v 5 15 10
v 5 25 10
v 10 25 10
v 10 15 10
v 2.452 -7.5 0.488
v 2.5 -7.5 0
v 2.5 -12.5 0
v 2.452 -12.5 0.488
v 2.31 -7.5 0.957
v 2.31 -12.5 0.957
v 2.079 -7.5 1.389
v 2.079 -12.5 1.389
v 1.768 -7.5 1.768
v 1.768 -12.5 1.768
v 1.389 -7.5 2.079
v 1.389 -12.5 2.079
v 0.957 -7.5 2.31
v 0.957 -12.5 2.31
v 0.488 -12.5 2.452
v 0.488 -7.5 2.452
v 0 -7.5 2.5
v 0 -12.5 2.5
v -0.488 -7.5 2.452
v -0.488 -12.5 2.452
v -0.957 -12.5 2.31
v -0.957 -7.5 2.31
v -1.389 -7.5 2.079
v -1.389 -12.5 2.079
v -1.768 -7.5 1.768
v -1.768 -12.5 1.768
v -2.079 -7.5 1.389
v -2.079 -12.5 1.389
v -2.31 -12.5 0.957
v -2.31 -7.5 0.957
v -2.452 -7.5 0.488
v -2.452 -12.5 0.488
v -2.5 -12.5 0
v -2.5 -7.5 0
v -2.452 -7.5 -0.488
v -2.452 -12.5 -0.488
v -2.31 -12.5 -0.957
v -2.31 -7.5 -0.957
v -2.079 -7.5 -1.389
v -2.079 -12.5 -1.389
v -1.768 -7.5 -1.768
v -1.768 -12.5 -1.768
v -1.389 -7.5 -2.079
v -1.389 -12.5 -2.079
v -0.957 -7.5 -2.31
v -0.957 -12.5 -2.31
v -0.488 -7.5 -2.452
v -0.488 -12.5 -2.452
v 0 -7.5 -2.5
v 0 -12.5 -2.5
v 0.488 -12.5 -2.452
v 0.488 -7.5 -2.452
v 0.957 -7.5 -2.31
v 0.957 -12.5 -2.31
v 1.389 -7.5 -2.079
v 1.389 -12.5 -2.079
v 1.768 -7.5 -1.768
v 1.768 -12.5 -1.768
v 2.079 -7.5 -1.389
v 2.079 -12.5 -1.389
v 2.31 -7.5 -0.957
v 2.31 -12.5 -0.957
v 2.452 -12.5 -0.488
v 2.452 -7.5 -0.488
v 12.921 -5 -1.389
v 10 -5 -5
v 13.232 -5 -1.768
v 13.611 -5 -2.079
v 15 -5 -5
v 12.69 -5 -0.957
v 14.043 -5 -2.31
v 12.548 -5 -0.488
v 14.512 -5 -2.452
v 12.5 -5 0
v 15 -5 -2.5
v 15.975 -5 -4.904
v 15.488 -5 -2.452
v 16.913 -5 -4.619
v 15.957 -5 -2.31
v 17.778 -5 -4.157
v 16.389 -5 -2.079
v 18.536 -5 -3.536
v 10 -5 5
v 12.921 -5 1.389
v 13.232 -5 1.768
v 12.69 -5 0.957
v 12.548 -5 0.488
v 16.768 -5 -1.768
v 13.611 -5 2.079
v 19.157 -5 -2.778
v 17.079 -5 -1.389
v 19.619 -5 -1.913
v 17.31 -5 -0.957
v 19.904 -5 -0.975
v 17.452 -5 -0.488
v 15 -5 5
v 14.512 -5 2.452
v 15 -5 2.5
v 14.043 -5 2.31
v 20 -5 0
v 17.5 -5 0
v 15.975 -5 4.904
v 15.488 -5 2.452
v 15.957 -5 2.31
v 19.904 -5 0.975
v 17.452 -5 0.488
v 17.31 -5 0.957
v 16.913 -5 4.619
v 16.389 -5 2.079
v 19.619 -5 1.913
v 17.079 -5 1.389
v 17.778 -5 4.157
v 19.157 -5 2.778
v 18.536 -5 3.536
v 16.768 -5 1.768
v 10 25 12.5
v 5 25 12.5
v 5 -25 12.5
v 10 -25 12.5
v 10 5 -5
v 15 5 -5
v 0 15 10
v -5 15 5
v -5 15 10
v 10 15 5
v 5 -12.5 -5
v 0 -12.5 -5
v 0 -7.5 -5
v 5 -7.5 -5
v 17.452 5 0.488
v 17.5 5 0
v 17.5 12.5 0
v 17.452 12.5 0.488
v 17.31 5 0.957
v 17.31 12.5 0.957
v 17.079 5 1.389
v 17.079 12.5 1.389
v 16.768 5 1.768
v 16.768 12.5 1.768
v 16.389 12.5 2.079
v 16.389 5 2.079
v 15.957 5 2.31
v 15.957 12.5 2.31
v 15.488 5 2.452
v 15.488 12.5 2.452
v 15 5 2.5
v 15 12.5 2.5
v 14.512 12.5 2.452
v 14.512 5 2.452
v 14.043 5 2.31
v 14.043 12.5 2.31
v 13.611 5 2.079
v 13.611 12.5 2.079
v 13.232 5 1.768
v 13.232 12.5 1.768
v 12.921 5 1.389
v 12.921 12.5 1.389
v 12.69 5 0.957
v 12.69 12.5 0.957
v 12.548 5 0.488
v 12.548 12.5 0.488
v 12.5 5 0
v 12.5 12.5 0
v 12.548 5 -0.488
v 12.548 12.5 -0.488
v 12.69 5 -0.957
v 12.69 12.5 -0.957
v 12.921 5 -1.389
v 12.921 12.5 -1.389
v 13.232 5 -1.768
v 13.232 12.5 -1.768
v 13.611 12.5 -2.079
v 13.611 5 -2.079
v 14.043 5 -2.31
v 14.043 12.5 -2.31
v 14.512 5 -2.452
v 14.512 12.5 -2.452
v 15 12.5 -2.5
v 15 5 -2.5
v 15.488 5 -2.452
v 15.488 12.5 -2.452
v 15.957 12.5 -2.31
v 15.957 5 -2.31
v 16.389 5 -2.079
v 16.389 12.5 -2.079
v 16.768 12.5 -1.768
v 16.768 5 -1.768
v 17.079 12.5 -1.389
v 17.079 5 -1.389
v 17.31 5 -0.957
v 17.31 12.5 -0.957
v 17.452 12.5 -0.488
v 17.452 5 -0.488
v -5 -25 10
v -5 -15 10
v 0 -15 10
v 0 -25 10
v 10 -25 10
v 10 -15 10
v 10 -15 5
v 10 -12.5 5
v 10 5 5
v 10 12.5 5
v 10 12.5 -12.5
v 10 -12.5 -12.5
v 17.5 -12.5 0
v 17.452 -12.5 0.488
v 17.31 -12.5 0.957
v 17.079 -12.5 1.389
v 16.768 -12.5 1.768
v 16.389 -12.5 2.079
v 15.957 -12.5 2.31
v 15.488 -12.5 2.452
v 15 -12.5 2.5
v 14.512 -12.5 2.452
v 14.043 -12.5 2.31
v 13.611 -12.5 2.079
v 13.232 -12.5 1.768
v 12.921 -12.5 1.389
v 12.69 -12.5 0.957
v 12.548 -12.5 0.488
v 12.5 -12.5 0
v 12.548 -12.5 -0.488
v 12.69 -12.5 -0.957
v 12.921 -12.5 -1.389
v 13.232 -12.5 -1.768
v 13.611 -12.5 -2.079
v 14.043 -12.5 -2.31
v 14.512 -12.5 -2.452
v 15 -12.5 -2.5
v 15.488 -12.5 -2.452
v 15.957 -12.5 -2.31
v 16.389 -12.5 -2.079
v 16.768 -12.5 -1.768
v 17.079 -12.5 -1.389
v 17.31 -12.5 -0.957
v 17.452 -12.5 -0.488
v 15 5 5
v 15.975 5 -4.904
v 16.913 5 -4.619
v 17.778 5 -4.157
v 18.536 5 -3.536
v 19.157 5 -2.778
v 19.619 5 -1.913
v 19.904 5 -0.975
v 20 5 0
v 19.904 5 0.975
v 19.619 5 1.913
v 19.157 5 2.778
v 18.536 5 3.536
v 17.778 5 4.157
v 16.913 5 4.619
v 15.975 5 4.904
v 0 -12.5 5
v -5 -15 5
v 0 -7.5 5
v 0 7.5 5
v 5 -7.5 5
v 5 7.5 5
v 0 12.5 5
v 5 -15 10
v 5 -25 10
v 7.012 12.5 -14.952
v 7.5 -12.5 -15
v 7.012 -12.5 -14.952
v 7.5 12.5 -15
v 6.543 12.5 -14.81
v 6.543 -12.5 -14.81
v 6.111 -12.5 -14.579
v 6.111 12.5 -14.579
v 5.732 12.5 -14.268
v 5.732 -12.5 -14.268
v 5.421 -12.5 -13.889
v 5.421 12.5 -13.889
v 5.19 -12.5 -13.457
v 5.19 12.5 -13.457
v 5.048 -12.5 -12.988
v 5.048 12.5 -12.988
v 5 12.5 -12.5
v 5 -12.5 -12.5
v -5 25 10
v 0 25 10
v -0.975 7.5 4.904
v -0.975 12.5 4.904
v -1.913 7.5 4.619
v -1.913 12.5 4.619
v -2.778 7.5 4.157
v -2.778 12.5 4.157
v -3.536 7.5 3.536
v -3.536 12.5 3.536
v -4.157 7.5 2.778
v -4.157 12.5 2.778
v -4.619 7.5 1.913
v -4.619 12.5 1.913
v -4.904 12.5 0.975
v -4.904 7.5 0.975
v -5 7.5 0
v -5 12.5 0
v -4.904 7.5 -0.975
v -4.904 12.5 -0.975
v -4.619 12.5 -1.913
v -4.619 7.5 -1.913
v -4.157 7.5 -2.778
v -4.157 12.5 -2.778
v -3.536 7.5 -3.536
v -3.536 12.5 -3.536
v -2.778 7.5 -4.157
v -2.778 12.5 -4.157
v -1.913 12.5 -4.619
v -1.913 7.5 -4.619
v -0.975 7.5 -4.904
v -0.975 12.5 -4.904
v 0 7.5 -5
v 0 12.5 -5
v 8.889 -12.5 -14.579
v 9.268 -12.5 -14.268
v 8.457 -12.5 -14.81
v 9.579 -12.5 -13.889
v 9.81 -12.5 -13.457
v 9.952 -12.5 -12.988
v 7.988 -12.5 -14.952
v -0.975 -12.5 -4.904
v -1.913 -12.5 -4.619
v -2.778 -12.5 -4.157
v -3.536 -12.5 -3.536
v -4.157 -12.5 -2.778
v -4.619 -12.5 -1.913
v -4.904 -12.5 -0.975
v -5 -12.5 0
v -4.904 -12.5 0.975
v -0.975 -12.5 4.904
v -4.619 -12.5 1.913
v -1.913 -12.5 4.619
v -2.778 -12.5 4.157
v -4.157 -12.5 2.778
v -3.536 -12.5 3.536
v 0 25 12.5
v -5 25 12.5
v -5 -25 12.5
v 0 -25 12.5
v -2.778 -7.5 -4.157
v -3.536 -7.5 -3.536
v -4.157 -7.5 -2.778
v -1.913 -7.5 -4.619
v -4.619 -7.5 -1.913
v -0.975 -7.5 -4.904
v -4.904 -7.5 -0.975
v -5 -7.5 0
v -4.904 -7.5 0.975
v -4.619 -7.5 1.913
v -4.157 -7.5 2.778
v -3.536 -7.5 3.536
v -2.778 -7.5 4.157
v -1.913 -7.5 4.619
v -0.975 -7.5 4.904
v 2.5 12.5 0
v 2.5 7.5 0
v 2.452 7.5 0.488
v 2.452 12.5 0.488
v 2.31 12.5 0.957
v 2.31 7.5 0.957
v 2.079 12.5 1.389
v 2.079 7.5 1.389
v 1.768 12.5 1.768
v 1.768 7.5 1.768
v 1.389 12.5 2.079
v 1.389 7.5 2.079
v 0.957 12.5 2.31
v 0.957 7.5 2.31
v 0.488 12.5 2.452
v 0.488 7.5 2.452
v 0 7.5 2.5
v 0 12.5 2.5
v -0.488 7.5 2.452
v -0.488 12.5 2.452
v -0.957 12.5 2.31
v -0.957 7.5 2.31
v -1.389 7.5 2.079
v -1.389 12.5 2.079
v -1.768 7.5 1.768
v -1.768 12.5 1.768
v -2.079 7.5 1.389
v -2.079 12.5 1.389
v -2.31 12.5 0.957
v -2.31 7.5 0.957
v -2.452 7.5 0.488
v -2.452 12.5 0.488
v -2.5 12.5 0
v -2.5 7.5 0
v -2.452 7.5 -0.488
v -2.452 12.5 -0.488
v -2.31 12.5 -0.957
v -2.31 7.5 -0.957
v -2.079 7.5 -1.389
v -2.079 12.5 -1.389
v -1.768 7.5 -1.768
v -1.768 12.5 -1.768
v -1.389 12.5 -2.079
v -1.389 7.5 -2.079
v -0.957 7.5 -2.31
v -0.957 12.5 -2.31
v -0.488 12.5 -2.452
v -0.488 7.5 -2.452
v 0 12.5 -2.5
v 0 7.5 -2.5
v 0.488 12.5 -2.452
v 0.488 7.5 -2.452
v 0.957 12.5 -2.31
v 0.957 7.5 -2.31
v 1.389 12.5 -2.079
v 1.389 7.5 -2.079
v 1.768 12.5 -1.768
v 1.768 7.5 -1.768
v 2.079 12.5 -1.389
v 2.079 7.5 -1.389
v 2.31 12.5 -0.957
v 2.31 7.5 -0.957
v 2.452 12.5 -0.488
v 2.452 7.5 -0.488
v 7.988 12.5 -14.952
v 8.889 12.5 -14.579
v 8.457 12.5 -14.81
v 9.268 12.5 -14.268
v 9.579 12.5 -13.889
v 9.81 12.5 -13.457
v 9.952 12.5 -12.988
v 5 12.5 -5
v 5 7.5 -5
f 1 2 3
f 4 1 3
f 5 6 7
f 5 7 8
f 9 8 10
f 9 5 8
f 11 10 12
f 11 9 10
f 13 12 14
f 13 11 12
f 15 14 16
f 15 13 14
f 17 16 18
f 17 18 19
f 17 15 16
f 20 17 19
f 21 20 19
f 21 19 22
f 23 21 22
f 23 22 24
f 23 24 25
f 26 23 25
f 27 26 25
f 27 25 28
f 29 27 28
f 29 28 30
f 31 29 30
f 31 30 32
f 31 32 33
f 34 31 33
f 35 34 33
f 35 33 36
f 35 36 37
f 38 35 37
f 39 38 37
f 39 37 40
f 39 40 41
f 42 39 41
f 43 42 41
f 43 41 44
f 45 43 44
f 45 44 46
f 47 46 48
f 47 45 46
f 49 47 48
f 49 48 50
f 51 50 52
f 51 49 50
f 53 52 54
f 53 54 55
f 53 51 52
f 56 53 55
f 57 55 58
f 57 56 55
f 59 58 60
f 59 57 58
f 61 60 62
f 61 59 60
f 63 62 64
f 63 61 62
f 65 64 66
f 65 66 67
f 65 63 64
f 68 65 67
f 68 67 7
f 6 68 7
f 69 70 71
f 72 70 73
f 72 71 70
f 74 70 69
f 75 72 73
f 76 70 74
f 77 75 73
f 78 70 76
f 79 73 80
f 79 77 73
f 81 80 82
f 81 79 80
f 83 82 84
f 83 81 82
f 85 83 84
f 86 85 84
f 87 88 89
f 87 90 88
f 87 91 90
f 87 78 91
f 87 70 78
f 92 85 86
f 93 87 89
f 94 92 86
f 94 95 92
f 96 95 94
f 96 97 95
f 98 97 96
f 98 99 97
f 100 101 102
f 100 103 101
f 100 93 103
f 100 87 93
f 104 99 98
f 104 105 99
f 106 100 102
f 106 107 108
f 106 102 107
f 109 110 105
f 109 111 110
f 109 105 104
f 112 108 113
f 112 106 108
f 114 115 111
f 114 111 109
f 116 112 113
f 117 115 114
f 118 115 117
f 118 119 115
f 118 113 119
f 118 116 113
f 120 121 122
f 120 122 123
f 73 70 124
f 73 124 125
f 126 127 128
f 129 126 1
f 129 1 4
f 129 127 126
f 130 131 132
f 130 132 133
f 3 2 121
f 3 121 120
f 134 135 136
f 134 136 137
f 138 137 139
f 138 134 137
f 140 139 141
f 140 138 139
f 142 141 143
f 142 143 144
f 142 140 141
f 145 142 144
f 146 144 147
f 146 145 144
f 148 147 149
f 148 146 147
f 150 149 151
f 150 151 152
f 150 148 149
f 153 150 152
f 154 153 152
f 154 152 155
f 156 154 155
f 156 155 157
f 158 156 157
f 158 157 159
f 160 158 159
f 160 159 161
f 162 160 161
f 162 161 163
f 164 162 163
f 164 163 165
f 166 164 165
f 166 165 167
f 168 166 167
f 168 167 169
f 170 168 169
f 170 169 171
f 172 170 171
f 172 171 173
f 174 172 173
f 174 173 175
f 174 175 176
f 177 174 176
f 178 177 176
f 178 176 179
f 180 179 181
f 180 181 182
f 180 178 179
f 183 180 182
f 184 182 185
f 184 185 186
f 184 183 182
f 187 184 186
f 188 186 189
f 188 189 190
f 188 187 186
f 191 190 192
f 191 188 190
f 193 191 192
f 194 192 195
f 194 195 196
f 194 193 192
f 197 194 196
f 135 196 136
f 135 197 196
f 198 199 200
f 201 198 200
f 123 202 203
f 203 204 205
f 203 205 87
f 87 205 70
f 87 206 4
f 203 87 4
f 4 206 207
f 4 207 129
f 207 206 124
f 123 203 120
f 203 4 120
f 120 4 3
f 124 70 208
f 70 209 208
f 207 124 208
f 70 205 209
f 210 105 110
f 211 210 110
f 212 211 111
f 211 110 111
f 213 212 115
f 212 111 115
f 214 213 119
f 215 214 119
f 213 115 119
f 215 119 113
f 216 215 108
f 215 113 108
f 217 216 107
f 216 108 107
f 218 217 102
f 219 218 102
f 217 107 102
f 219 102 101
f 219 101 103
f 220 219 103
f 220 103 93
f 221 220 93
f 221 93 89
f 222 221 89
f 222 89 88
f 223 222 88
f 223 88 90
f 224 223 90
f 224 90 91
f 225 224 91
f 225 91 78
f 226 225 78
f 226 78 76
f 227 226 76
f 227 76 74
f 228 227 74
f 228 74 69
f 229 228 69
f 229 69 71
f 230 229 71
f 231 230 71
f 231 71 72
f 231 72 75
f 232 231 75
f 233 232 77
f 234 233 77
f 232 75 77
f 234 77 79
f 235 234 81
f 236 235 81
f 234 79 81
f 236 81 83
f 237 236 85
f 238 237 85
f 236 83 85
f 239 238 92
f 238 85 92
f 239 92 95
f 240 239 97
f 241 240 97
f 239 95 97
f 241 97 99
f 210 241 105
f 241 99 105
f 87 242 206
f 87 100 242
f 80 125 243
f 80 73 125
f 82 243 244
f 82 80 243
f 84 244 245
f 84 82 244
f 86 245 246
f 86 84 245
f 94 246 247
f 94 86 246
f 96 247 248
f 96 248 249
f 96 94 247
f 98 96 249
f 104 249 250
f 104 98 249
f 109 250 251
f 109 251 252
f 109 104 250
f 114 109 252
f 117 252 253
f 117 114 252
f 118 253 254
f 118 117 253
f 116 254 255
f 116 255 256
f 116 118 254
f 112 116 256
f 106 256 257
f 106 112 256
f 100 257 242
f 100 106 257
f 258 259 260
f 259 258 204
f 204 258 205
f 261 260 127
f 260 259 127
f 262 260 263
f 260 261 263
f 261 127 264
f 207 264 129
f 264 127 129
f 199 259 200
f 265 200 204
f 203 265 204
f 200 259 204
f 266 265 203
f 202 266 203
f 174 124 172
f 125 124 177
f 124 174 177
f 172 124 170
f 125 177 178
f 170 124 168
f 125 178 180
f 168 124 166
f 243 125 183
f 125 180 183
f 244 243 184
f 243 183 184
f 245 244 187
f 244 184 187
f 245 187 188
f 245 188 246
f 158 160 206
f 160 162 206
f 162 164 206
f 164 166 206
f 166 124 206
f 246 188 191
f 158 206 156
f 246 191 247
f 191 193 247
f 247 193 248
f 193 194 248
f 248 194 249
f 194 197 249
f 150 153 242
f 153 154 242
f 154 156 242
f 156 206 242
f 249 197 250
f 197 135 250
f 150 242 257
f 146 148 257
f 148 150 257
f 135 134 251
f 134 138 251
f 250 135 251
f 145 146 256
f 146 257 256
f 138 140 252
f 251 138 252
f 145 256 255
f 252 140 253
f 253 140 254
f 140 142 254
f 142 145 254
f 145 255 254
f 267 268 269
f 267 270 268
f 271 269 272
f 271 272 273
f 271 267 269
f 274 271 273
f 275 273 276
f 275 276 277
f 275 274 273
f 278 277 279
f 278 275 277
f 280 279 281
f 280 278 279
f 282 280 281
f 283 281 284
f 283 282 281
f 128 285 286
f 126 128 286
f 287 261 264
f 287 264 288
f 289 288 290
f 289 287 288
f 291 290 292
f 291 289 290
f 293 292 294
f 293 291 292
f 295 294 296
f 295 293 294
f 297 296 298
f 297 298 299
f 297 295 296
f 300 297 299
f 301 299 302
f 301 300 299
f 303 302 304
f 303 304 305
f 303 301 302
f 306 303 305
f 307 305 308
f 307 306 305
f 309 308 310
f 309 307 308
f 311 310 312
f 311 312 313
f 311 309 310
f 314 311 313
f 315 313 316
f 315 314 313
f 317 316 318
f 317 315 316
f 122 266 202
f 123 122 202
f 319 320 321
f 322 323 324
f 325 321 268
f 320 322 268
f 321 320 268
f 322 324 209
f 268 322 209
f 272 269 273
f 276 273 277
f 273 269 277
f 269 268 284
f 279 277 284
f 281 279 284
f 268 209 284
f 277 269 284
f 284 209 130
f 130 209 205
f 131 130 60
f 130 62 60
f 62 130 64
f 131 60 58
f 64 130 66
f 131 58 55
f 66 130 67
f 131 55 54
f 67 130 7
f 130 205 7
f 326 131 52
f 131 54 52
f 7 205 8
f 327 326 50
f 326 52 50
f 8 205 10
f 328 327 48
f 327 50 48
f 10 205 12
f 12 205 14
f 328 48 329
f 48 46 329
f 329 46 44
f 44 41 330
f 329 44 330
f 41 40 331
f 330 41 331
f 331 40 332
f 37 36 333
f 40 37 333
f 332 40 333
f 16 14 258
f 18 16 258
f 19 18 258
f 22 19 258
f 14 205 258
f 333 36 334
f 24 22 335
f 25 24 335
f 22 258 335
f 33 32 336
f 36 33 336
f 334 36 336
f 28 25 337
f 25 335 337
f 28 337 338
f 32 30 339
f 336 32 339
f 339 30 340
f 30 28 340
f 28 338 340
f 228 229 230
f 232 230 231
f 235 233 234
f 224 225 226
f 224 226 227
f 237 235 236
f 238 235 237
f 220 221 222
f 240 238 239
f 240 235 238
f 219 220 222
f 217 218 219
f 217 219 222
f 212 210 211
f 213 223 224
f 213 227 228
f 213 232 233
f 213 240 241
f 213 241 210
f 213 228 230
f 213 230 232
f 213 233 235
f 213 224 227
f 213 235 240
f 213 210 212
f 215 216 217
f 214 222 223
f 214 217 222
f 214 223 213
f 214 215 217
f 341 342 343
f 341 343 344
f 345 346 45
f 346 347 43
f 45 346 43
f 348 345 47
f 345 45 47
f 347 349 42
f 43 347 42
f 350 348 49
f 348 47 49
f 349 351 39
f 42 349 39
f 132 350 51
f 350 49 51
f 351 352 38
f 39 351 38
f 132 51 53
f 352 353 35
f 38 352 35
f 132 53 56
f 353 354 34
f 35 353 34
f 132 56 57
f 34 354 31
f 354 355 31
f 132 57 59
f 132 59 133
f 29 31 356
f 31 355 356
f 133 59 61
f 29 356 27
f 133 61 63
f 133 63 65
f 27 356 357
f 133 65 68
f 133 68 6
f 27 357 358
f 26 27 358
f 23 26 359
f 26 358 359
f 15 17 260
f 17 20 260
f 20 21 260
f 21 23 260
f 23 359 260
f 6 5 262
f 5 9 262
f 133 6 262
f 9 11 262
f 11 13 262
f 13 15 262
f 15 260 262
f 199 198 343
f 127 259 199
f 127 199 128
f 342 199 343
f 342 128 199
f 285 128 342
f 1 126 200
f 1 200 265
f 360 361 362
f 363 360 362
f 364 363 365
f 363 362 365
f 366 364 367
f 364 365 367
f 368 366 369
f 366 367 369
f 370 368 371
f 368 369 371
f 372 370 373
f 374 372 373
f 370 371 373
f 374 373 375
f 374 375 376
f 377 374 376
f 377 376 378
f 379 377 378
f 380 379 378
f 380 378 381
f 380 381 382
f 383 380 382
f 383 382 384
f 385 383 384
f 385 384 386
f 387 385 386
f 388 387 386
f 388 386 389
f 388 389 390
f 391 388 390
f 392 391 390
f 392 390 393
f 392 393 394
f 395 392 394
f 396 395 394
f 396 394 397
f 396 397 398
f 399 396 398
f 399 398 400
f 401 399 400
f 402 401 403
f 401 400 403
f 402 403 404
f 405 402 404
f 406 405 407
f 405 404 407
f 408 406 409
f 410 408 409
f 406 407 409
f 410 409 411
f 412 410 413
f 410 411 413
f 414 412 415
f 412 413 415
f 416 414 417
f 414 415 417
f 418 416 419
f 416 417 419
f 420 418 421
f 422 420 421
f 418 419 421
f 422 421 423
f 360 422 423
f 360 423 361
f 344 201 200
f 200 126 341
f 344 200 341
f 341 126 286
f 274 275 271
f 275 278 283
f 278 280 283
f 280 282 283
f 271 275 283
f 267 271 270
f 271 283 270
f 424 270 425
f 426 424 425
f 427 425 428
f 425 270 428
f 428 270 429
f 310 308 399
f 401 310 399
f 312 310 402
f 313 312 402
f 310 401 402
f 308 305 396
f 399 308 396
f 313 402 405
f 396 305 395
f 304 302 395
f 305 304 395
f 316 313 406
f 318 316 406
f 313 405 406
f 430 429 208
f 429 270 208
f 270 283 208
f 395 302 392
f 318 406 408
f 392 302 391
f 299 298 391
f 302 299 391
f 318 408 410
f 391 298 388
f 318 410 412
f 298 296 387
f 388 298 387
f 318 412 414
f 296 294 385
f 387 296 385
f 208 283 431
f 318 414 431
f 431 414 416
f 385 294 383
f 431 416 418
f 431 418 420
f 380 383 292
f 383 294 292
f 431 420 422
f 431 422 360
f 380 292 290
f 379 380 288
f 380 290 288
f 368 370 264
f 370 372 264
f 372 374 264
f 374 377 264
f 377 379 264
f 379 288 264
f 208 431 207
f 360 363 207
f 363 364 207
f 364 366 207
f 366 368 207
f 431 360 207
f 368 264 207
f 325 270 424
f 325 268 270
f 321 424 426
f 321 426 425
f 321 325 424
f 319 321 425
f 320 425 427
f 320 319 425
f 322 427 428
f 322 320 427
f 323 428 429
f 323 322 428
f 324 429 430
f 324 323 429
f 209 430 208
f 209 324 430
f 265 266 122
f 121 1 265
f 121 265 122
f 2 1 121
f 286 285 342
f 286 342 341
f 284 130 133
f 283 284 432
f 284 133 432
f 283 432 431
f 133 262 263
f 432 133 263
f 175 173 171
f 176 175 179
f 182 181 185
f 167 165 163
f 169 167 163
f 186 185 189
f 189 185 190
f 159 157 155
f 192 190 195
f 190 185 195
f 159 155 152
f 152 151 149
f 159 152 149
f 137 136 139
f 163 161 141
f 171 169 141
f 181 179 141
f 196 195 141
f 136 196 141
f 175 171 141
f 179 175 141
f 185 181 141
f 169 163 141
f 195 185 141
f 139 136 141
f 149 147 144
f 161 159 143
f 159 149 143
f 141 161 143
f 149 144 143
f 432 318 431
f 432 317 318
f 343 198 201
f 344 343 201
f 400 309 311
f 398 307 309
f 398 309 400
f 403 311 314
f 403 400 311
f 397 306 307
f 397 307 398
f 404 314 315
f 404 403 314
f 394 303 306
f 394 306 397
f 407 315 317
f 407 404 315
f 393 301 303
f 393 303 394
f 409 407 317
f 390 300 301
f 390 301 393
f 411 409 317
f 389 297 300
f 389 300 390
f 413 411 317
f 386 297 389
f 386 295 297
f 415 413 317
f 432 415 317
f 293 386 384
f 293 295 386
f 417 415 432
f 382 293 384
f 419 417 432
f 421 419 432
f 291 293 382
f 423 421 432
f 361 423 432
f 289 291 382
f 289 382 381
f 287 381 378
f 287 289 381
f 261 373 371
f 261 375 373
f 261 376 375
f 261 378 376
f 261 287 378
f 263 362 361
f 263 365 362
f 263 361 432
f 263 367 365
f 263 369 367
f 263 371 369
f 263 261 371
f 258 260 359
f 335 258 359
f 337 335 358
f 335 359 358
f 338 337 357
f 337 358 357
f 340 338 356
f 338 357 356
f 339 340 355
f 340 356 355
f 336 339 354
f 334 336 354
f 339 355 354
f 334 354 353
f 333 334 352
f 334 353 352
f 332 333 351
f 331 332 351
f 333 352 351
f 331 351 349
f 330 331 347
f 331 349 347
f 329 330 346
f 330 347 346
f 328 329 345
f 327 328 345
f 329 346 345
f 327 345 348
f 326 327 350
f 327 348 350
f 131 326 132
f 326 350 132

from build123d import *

# Parameters (mm, degrees)
F0_W      = 5
F0_H      = 10
F0_R      = 2.5
F1_DEPTH  = 12.5
F2_DEPTH  = 5
F3_DEPTH  = 12.5
F4_DEPTH  = 7.5
F7_DEPTH  = 10
F8_R      = 2.5
F9_R      = 2.49999
F10_W     = 15
F10_H     = 30
F11_DEPTH = 5
F12_W     = 5
F12_H     = 50
F13_DEPTH = 2.5


# Not quite as in the source:
# - a fillet or chamfer is up to 0.001 mm smaller than in the source, because OpenCascade refuses the exact size


with BuildPart() as f1:
    # F0 (on Front) → F1 (new body)
    with BuildSketch(Plane.XZ):
        with Locations((7.5, 0)):
            Rectangle(F0_W, F0_H)
        with BuildLine():
            Line((5, 5), (0, 5))
            ThreePointArc((0, 5), (-5, 0), (0, -5))
            Line((0, -5), (5, -5))
            Line((5, -5), (5, 5))
        make_face()
        Circle(F0_R, mode=Mode.SUBTRACT)
    extrude(amount=F1_DEPTH)

    # F0 (on Front) → F2 (join)
    with BuildSketch(Plane.XZ):
        with BuildLine():
            Line((15, 5), (10, 5))
            Line((10, 5), (10, -5))
            Line((10, -5), (15, -5))
            ThreePointArc((15, -5), (20, 0), (15, 5))
        make_face()
        with Locations((15, 0)):
            Circle(F0_R, mode=Mode.SUBTRACT)
    extrude(amount=F2_DEPTH)

    # F0 (on Front) → F3 (join)
    with BuildSketch(Plane.XZ):
        with Locations((15, 0)):
            Circle(F0_R)
    extrude(amount=F3_DEPTH)

    # F0 (on Front) → F4 (cut)
    with BuildSketch(Plane.XZ):
        with BuildLine():
            Line((5, 5), (0, 5))
            ThreePointArc((0, 5), (-5, 0), (0, -5))
            Line((0, -5), (5, -5))
            Line((5, -5), (5, 5))
        make_face()
        Circle(F0_R, mode=Mode.SUBTRACT)
    extrude(amount=F4_DEPTH, mode=Mode.SUBTRACT)

    # F5: F1 across plane


with BuildPart() as f1_1:
    add(f1.part)
    add(f1.part.mirror(Plane.XZ))

    # F6 (on face) → F7 (join)
    with BuildSketch(Plane(origin=(0, 0, -5), x_dir=(1, 0, 0), z_dir=(0, 0, -1))):
        Polygon((10, 5), (10, 12.5), (5, 12.5), (5, 7.5), (5, -7.5), (5, -12.5), (10, -12.5), (10, -5), align=None)
    extrude(amount=F7_DEPTH)

    # F8
    f8_edges = [f1_1.edges().sort_by_distance(p)[0] for p in [
        (10, 0, -15),
    ]]
    fillet(f8_edges, radius=F8_R)

    # F9 (radius 2.5 in the source; OpenCascade refuses exactly that, so slightly less here)
    f9_edges = [f1_1.edges().sort_by_distance(p)[0] for p in [
        (5, 0, -15),
    ]]
    fillet(f9_edges, radius=F9_R)

    # F10 (on face) → F11 (join)
    with BuildSketch(Plane.XY.offset(5)):
        with Locations((2.5, 0)):
            Rectangle(F10_W, F10_H)
    extrude(amount=F11_DEPTH)

    # F12 (on face) → F13 (join)
    with BuildSketch(Plane.XY.offset(10)):
        with Locations((-2.5, 0)):
            Rectangle(F12_W, F12_H)
        with Locations((7.5, 0)):
            Rectangle(F12_W, F12_H)
    extrude(amount=F13_DEPTH)


solid = f1_1.part
